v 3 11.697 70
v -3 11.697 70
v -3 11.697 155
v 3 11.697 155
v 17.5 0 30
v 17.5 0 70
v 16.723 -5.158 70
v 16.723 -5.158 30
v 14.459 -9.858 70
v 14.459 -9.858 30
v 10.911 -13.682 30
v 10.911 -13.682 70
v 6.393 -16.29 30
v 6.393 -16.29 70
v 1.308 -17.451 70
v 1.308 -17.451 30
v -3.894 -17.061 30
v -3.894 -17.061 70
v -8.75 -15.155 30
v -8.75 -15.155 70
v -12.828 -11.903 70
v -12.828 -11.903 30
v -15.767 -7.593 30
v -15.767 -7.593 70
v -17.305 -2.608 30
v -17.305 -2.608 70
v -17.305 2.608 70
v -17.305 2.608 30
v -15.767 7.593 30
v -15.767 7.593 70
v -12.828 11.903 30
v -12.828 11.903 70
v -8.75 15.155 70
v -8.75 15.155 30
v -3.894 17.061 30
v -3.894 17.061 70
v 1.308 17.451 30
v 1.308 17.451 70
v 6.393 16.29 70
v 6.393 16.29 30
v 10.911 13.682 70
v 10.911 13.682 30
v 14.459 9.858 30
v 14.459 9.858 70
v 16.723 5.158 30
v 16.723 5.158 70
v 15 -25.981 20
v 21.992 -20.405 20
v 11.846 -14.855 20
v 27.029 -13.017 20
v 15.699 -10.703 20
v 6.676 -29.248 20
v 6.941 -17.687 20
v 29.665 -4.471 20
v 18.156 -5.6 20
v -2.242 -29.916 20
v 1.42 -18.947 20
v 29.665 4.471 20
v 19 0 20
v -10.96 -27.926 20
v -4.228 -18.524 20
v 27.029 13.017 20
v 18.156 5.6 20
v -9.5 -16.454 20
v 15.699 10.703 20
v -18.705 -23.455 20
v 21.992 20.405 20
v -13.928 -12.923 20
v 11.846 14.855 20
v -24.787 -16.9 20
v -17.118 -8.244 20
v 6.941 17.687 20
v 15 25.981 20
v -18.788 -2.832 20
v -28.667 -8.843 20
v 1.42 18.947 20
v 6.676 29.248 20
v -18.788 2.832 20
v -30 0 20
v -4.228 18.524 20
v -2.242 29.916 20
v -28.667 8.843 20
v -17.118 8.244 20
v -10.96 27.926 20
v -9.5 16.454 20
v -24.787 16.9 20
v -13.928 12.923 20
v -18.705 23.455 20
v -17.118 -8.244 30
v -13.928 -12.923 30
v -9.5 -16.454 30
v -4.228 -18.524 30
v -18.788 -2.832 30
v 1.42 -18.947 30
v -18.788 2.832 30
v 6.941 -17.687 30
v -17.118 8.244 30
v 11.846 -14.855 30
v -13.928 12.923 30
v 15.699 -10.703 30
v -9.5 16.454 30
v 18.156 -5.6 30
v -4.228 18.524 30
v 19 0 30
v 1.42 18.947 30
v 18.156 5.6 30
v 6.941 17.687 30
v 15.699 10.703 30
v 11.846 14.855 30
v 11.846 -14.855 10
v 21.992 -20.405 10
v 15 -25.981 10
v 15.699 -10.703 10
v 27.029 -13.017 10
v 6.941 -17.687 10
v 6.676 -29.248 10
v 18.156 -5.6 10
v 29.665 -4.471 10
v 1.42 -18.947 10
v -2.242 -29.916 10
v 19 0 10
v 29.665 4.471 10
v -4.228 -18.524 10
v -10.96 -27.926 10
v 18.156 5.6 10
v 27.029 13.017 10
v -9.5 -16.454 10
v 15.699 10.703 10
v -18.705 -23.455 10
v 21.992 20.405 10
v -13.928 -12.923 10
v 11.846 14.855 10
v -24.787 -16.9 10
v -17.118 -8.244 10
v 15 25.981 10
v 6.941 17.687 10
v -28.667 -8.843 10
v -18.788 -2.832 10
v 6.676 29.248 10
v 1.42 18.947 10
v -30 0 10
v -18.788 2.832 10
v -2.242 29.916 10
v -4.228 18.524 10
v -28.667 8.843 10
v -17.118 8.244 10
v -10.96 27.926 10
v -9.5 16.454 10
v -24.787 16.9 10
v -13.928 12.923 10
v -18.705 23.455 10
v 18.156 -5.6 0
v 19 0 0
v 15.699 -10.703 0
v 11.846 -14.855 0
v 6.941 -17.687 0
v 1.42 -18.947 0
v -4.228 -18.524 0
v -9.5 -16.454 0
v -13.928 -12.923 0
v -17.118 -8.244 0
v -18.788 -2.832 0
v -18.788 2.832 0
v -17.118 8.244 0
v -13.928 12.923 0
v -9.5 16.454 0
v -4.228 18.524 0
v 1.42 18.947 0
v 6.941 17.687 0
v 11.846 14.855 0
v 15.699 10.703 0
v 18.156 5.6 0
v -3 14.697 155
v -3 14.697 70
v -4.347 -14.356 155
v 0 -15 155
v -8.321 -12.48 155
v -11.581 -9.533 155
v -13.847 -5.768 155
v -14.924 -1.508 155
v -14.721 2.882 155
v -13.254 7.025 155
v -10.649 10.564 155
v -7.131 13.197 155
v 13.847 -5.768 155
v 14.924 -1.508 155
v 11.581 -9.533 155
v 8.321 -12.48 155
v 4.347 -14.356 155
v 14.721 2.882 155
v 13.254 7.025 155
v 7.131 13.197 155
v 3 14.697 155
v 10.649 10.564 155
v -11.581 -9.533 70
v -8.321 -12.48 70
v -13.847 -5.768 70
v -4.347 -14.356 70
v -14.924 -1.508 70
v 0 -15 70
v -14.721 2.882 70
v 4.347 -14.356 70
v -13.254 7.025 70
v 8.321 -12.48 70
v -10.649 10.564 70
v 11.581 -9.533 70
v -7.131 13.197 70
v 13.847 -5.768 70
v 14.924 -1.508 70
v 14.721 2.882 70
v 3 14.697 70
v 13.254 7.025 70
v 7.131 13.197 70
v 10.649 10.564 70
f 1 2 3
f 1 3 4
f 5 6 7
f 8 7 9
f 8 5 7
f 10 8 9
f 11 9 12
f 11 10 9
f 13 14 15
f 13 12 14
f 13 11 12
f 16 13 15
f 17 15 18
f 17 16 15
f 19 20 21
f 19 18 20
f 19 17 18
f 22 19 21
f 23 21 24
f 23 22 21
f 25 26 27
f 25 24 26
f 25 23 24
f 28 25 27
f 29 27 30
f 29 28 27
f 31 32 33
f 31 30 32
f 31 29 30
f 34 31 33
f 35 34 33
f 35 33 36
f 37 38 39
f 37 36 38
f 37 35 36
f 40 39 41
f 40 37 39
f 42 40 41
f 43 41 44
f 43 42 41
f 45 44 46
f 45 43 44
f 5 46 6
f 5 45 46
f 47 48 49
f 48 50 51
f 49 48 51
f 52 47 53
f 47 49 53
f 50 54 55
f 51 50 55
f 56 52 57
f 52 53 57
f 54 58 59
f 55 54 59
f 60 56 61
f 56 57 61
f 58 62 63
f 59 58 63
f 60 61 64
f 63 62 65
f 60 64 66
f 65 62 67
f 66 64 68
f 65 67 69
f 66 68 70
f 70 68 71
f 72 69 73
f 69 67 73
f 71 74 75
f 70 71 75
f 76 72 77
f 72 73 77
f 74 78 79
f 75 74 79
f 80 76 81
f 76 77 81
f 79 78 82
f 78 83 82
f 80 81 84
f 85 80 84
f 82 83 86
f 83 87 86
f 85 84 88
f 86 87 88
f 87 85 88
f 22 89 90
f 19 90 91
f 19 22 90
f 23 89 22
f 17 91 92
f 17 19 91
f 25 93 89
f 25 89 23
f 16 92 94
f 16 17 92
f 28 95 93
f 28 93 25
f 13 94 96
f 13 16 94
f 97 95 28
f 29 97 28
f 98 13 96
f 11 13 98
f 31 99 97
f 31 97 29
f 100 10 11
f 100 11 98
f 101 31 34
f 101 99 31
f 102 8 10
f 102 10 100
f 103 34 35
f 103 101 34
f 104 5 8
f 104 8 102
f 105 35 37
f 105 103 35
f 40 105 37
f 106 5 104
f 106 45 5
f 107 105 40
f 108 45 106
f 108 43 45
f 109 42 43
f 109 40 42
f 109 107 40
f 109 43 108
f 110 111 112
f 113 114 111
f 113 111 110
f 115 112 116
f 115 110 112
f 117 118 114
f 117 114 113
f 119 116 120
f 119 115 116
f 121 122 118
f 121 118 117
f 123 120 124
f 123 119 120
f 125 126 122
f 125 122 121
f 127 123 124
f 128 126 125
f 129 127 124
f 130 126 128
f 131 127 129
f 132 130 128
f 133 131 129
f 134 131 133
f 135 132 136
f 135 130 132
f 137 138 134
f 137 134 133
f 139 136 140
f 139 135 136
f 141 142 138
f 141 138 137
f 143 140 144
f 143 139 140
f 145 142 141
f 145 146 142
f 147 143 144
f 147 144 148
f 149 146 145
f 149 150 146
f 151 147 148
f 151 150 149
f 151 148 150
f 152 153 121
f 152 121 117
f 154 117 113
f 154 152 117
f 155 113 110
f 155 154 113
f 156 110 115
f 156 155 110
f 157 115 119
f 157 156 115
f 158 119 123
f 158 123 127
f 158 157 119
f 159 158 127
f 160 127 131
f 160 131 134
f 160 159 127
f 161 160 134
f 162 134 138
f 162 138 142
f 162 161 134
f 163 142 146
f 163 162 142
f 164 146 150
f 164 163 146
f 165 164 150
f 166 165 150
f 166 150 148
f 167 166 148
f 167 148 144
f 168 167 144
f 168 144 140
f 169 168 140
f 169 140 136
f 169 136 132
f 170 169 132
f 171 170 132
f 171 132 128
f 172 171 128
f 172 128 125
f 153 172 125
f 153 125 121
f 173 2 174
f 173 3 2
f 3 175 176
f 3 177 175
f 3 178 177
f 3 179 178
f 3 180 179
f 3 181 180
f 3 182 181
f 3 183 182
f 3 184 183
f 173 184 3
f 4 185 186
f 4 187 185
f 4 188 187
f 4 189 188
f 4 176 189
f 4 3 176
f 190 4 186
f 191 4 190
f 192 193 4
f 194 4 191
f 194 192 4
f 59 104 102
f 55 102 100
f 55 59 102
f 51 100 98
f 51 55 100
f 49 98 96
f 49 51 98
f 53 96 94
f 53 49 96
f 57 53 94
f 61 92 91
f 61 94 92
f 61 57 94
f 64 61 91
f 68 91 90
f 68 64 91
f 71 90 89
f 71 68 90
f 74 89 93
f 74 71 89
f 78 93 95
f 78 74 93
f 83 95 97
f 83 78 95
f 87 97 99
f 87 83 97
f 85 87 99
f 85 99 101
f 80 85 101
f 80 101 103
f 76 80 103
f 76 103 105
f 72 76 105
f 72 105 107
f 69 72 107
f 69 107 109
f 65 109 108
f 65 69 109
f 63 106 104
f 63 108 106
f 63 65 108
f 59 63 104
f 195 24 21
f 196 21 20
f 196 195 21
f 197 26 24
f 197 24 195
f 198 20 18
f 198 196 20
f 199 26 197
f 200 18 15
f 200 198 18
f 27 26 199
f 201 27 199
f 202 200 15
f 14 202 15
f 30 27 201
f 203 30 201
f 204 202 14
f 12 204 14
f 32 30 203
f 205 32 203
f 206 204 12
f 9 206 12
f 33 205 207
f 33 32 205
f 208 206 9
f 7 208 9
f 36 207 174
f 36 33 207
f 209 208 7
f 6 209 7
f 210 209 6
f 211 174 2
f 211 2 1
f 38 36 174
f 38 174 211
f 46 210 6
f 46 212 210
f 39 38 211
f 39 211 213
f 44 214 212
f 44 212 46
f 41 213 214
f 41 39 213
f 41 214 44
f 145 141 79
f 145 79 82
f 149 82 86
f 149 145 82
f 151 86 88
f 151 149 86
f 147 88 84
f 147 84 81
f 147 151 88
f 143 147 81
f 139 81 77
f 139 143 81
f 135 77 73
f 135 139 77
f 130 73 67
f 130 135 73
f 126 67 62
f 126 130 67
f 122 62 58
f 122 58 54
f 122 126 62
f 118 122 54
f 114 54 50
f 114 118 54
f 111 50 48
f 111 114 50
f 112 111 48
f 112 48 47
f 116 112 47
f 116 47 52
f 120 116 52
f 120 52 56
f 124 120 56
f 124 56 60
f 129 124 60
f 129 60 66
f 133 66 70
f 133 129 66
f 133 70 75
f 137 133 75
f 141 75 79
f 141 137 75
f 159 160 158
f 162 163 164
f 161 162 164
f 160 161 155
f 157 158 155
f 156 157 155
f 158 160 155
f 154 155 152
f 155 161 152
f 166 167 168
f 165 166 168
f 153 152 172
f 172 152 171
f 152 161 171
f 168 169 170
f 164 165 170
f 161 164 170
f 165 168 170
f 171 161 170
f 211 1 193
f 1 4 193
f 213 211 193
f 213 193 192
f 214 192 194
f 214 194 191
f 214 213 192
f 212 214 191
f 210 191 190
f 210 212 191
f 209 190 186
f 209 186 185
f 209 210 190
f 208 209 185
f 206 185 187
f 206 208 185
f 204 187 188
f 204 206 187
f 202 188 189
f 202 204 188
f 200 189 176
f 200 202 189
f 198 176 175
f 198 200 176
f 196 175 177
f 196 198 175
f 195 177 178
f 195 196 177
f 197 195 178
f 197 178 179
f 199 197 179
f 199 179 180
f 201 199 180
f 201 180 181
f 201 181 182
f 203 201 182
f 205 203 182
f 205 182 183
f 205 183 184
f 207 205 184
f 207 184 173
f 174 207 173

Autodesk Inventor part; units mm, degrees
ref_plane "YZ Plane" through (0, 0, 0) normal (1, 0, 0) x (0, 1, 0)
ref_plane "XZ Plane" through (0, 0, 0) normal (0, 1, 0) x (-1, 0, 0)
ref_plane "XY Plane" through (0, 0, 0) normal (0, 0, 1) x (1, 0, 0)
sketch "Sketch1" plane through (0, 0, 0) normal (0, 0, 1) x (1, 0, 0)
  circle A0 centre (0, 0) radius 19
  dimension "d0" = 38
extrude "Extrusion1" add sketch "Sketch1" along normal blind 30
ref_plane "Work Plane1" through (0, 0, 10) normal (0, 0, -1) x (-1, 0, 0)
sketch "Sketch2" plane through (0, 0, 10) normal (0, 0, -1) x (-1, 0, 0)
  circle A0 centre (0, 0) radius 30
  dimension "d4" = 60
extrude "Extrusion2" add sketch "Sketch2" against normal blind 10
sketch "Sketch3" plane through (0, 0, 30) normal (0, 0, 1) x (1, 0, 0)
  circle A0 centre (0, 0) radius 17.5
  dimension "d7" = 35
extrude "Extrusion3" add sketch "Sketch3" along normal blind 40
sketch "Sketch4" plane through (0, 0, 70) normal (0, 0, 1) x (1, 0, 0)
  circle A0 centre (0, 0) radius 15
  dimension "d10" = 30
extrude "Extrusion4" add sketch "Sketch4" along normal blind 85
sketch "Sketch5" plane through (0, 0, 155) normal (0, 0, 1) x (1, 0, 0)
  line L0 (-3, 11.6969) -> (-3, 14.6969)
  circle A0 centre (0, 0) radius 15 projected
  line L1 (3, 11.6969) -> (3, 14.6969)
  arc A1 (3, 14.6969) -> (-3, 14.6969) centre (0, 0) ccw
  line L2 (-3, 14.6969) -> (-3, 11.6969)
  line L3 (-3, 11.6969) -> (3, 11.6969)
  line L4 (3, 11.6969) -> (3, 14.6969)
  dimension "d15" = 3
  dimension "d16" = 6
extrude "Extrusion5" cut sketch "Sketch5" against normal blind 85 contours L0 A0 L1 L3 picked at (0.3353, 12.7867)
properties part number "project handle part"
